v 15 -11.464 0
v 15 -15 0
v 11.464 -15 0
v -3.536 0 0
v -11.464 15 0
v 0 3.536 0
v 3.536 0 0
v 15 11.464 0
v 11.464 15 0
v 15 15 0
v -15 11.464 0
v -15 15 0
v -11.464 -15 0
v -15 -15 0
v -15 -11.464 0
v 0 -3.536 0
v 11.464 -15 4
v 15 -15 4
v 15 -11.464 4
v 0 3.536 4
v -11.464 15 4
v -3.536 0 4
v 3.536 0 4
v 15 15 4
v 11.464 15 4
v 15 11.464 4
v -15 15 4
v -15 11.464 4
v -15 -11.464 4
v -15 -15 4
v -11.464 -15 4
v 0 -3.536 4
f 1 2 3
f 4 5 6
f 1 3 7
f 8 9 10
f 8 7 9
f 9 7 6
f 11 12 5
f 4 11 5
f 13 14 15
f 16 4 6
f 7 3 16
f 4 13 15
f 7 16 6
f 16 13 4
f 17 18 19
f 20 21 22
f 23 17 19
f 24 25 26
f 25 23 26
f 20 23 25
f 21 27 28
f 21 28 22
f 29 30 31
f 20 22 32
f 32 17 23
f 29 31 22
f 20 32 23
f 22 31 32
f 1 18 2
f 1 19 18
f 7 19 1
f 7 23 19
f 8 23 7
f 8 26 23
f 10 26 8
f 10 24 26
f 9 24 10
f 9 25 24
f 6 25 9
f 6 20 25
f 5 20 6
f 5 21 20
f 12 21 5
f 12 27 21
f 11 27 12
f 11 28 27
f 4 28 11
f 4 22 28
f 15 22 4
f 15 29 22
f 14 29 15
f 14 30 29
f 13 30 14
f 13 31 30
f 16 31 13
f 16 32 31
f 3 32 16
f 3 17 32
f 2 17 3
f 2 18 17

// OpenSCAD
linear_extrude(height = 4.0, twist = 0.0, scale = 1.0, slices = 1, center = false)
{
    intersection()
    {
        rotate(45.0)
        {
            union()
            {
                scale([42.42640687119285, 5.0])
                {
                    M8();
                }
                rotate(90.0)
                {
                    scale([42.42640687119285, 5.0])
                    {
                        M8();
                    }
                }
            }
        }
        scale([30.0, 30.0])
        {
            M8();
        }
    }
}

module M8()
{
    polygon
    (
        points =
        [
            [-0.5, -0.5], 
            [0.5, -0.5], 
            [0.5, 0.5], 
            [-0.5, 0.5]
        ],
        paths =
        [
            [0, 1, 2, 3]
        ]
    );
}
